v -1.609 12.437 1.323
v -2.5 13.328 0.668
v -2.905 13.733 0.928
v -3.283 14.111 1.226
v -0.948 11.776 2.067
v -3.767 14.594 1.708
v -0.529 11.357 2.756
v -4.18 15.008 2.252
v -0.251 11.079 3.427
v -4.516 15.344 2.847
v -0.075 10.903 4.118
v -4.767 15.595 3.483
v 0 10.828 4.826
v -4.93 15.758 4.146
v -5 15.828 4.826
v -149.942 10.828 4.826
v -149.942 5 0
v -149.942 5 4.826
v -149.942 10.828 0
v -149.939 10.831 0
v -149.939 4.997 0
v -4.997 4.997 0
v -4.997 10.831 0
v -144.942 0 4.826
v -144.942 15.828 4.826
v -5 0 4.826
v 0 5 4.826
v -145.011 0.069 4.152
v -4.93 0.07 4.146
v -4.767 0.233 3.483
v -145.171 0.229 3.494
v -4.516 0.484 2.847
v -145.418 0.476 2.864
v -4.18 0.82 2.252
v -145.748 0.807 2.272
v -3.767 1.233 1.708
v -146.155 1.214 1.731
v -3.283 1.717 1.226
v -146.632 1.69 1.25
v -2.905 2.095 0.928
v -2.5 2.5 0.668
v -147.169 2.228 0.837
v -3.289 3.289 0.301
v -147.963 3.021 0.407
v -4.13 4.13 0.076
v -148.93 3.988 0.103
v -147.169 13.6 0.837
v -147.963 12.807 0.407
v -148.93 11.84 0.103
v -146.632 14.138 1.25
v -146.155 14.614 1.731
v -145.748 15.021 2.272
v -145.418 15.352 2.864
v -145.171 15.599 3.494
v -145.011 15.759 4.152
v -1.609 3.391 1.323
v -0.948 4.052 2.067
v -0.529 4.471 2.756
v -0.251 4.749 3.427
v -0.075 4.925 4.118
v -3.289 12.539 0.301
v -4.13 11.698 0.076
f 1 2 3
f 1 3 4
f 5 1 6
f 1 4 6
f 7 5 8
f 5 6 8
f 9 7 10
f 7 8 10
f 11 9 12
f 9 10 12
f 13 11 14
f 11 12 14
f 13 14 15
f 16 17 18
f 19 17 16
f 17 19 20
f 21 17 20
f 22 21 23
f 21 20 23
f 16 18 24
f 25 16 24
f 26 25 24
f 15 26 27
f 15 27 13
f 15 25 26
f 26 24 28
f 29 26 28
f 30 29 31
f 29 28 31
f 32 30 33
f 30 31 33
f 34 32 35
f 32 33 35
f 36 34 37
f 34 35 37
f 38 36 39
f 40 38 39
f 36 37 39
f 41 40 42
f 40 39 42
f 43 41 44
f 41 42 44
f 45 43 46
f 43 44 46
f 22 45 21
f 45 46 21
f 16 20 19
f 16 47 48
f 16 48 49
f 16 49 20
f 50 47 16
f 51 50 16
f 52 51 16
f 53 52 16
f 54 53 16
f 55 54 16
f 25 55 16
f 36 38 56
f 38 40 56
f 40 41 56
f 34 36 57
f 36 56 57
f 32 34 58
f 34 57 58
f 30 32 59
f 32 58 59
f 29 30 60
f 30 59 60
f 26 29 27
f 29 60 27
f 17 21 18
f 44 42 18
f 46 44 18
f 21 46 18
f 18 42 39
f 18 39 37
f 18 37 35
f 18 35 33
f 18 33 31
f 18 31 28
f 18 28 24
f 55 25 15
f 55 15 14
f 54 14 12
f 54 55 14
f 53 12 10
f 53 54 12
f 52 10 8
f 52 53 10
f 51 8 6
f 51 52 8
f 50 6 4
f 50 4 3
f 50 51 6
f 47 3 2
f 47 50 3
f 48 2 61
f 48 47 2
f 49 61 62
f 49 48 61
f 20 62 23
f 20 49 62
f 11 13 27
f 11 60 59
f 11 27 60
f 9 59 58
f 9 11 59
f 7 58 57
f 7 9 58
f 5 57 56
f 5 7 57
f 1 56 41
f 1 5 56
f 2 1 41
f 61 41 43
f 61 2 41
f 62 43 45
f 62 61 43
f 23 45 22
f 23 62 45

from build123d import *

# Parameters (mm, degrees)
F0_W        = 149.9416083097
F0_H        = 15.8279500902
F1_DEPTH    = 4.826
F2_SIZE     = 5
F3_T1_DEPTH = 164.9264657238
F4_T1_DEPTH = 164.9264657238
F5_T1_DEPTH = 30.8128075042


# Not quite as in the source:
# - a fillet or chamfer that OpenCascade refuses, or shapes differently, is made with other operations: its cross-section is extruded or revolved along the edge and cut away or added


with BuildPart() as f1:
    # F0 (on Top) → F1 (new body)
    with BuildSketch(Plane.XY):
        with Locations((-74.9708041549, 7.9139750451)):
            Rectangle(F0_W, F0_H)
    extrude(amount=F1_DEPTH)

    # F2
    f2_edges = [f1.edges().sort_by_distance(p)[0] for p in [
        (-149.941608, 15.82795, 2.413),
        (-149.941608, 0, 2.413),
        (0, 15.82795, 2.413),
        (0, 0, 2.413),
    ]]
    chamfer(f2_edges, length=F2_SIZE)

    # F3: fillet of radius 5 on 1 edges, made by hand

    # F3_s2 → F3_t1 (cut)
    with BuildSketch(Plane.YZ.offset(-157.4340370168)):
        with BuildLine():
            ThreePointArc((0, 4.826), (1.5235005962, 1.4034738983), (4.9969714828, 0))
            Line((4.9969714828, 0), (0, 0))
            Line((0, 0), (0, 4.826))
        make_face()
    extrude(amount=F3_T1_DEPTH, mode=Mode.SUBTRACT)

    # F4: fillet of radius 5 on 1 edges, made by hand

    # F4_s2 → F4_t1 (cut)
    with BuildSketch(Plane.YZ.offset(-157.4340370168)):
        with BuildLine():
            ThreePointArc((15.8279500902, 4.826), (14.304449494, 1.4034738983), (10.8309786074, 0))
            Line((10.8309786074, 0), (15.8279500902, 0))
            Line((15.8279500902, 0), (15.8279500902, 4.826))
        make_face()
    extrude(amount=F4_T1_DEPTH, mode=Mode.SUBTRACT)

    # F5: fillet of radius 5 on 1 edges, made by hand

    # F5_s2 → F5_t1 (cut)
    with BuildSketch(Plane.XZ.offset(-23.3203787972)):
        with BuildLine():
            ThreePointArc((0, 4.826), (-1.5235005962, 1.4034738983), (-4.9969714828, 0))
            Line((-4.9969714828, 0), (0, 0))
            Line((0, 0), (0, 4.826))
        make_face()
    extrude(amount=F5_T1_DEPTH, mode=Mode.SUBTRACT)


solid = f1.part
